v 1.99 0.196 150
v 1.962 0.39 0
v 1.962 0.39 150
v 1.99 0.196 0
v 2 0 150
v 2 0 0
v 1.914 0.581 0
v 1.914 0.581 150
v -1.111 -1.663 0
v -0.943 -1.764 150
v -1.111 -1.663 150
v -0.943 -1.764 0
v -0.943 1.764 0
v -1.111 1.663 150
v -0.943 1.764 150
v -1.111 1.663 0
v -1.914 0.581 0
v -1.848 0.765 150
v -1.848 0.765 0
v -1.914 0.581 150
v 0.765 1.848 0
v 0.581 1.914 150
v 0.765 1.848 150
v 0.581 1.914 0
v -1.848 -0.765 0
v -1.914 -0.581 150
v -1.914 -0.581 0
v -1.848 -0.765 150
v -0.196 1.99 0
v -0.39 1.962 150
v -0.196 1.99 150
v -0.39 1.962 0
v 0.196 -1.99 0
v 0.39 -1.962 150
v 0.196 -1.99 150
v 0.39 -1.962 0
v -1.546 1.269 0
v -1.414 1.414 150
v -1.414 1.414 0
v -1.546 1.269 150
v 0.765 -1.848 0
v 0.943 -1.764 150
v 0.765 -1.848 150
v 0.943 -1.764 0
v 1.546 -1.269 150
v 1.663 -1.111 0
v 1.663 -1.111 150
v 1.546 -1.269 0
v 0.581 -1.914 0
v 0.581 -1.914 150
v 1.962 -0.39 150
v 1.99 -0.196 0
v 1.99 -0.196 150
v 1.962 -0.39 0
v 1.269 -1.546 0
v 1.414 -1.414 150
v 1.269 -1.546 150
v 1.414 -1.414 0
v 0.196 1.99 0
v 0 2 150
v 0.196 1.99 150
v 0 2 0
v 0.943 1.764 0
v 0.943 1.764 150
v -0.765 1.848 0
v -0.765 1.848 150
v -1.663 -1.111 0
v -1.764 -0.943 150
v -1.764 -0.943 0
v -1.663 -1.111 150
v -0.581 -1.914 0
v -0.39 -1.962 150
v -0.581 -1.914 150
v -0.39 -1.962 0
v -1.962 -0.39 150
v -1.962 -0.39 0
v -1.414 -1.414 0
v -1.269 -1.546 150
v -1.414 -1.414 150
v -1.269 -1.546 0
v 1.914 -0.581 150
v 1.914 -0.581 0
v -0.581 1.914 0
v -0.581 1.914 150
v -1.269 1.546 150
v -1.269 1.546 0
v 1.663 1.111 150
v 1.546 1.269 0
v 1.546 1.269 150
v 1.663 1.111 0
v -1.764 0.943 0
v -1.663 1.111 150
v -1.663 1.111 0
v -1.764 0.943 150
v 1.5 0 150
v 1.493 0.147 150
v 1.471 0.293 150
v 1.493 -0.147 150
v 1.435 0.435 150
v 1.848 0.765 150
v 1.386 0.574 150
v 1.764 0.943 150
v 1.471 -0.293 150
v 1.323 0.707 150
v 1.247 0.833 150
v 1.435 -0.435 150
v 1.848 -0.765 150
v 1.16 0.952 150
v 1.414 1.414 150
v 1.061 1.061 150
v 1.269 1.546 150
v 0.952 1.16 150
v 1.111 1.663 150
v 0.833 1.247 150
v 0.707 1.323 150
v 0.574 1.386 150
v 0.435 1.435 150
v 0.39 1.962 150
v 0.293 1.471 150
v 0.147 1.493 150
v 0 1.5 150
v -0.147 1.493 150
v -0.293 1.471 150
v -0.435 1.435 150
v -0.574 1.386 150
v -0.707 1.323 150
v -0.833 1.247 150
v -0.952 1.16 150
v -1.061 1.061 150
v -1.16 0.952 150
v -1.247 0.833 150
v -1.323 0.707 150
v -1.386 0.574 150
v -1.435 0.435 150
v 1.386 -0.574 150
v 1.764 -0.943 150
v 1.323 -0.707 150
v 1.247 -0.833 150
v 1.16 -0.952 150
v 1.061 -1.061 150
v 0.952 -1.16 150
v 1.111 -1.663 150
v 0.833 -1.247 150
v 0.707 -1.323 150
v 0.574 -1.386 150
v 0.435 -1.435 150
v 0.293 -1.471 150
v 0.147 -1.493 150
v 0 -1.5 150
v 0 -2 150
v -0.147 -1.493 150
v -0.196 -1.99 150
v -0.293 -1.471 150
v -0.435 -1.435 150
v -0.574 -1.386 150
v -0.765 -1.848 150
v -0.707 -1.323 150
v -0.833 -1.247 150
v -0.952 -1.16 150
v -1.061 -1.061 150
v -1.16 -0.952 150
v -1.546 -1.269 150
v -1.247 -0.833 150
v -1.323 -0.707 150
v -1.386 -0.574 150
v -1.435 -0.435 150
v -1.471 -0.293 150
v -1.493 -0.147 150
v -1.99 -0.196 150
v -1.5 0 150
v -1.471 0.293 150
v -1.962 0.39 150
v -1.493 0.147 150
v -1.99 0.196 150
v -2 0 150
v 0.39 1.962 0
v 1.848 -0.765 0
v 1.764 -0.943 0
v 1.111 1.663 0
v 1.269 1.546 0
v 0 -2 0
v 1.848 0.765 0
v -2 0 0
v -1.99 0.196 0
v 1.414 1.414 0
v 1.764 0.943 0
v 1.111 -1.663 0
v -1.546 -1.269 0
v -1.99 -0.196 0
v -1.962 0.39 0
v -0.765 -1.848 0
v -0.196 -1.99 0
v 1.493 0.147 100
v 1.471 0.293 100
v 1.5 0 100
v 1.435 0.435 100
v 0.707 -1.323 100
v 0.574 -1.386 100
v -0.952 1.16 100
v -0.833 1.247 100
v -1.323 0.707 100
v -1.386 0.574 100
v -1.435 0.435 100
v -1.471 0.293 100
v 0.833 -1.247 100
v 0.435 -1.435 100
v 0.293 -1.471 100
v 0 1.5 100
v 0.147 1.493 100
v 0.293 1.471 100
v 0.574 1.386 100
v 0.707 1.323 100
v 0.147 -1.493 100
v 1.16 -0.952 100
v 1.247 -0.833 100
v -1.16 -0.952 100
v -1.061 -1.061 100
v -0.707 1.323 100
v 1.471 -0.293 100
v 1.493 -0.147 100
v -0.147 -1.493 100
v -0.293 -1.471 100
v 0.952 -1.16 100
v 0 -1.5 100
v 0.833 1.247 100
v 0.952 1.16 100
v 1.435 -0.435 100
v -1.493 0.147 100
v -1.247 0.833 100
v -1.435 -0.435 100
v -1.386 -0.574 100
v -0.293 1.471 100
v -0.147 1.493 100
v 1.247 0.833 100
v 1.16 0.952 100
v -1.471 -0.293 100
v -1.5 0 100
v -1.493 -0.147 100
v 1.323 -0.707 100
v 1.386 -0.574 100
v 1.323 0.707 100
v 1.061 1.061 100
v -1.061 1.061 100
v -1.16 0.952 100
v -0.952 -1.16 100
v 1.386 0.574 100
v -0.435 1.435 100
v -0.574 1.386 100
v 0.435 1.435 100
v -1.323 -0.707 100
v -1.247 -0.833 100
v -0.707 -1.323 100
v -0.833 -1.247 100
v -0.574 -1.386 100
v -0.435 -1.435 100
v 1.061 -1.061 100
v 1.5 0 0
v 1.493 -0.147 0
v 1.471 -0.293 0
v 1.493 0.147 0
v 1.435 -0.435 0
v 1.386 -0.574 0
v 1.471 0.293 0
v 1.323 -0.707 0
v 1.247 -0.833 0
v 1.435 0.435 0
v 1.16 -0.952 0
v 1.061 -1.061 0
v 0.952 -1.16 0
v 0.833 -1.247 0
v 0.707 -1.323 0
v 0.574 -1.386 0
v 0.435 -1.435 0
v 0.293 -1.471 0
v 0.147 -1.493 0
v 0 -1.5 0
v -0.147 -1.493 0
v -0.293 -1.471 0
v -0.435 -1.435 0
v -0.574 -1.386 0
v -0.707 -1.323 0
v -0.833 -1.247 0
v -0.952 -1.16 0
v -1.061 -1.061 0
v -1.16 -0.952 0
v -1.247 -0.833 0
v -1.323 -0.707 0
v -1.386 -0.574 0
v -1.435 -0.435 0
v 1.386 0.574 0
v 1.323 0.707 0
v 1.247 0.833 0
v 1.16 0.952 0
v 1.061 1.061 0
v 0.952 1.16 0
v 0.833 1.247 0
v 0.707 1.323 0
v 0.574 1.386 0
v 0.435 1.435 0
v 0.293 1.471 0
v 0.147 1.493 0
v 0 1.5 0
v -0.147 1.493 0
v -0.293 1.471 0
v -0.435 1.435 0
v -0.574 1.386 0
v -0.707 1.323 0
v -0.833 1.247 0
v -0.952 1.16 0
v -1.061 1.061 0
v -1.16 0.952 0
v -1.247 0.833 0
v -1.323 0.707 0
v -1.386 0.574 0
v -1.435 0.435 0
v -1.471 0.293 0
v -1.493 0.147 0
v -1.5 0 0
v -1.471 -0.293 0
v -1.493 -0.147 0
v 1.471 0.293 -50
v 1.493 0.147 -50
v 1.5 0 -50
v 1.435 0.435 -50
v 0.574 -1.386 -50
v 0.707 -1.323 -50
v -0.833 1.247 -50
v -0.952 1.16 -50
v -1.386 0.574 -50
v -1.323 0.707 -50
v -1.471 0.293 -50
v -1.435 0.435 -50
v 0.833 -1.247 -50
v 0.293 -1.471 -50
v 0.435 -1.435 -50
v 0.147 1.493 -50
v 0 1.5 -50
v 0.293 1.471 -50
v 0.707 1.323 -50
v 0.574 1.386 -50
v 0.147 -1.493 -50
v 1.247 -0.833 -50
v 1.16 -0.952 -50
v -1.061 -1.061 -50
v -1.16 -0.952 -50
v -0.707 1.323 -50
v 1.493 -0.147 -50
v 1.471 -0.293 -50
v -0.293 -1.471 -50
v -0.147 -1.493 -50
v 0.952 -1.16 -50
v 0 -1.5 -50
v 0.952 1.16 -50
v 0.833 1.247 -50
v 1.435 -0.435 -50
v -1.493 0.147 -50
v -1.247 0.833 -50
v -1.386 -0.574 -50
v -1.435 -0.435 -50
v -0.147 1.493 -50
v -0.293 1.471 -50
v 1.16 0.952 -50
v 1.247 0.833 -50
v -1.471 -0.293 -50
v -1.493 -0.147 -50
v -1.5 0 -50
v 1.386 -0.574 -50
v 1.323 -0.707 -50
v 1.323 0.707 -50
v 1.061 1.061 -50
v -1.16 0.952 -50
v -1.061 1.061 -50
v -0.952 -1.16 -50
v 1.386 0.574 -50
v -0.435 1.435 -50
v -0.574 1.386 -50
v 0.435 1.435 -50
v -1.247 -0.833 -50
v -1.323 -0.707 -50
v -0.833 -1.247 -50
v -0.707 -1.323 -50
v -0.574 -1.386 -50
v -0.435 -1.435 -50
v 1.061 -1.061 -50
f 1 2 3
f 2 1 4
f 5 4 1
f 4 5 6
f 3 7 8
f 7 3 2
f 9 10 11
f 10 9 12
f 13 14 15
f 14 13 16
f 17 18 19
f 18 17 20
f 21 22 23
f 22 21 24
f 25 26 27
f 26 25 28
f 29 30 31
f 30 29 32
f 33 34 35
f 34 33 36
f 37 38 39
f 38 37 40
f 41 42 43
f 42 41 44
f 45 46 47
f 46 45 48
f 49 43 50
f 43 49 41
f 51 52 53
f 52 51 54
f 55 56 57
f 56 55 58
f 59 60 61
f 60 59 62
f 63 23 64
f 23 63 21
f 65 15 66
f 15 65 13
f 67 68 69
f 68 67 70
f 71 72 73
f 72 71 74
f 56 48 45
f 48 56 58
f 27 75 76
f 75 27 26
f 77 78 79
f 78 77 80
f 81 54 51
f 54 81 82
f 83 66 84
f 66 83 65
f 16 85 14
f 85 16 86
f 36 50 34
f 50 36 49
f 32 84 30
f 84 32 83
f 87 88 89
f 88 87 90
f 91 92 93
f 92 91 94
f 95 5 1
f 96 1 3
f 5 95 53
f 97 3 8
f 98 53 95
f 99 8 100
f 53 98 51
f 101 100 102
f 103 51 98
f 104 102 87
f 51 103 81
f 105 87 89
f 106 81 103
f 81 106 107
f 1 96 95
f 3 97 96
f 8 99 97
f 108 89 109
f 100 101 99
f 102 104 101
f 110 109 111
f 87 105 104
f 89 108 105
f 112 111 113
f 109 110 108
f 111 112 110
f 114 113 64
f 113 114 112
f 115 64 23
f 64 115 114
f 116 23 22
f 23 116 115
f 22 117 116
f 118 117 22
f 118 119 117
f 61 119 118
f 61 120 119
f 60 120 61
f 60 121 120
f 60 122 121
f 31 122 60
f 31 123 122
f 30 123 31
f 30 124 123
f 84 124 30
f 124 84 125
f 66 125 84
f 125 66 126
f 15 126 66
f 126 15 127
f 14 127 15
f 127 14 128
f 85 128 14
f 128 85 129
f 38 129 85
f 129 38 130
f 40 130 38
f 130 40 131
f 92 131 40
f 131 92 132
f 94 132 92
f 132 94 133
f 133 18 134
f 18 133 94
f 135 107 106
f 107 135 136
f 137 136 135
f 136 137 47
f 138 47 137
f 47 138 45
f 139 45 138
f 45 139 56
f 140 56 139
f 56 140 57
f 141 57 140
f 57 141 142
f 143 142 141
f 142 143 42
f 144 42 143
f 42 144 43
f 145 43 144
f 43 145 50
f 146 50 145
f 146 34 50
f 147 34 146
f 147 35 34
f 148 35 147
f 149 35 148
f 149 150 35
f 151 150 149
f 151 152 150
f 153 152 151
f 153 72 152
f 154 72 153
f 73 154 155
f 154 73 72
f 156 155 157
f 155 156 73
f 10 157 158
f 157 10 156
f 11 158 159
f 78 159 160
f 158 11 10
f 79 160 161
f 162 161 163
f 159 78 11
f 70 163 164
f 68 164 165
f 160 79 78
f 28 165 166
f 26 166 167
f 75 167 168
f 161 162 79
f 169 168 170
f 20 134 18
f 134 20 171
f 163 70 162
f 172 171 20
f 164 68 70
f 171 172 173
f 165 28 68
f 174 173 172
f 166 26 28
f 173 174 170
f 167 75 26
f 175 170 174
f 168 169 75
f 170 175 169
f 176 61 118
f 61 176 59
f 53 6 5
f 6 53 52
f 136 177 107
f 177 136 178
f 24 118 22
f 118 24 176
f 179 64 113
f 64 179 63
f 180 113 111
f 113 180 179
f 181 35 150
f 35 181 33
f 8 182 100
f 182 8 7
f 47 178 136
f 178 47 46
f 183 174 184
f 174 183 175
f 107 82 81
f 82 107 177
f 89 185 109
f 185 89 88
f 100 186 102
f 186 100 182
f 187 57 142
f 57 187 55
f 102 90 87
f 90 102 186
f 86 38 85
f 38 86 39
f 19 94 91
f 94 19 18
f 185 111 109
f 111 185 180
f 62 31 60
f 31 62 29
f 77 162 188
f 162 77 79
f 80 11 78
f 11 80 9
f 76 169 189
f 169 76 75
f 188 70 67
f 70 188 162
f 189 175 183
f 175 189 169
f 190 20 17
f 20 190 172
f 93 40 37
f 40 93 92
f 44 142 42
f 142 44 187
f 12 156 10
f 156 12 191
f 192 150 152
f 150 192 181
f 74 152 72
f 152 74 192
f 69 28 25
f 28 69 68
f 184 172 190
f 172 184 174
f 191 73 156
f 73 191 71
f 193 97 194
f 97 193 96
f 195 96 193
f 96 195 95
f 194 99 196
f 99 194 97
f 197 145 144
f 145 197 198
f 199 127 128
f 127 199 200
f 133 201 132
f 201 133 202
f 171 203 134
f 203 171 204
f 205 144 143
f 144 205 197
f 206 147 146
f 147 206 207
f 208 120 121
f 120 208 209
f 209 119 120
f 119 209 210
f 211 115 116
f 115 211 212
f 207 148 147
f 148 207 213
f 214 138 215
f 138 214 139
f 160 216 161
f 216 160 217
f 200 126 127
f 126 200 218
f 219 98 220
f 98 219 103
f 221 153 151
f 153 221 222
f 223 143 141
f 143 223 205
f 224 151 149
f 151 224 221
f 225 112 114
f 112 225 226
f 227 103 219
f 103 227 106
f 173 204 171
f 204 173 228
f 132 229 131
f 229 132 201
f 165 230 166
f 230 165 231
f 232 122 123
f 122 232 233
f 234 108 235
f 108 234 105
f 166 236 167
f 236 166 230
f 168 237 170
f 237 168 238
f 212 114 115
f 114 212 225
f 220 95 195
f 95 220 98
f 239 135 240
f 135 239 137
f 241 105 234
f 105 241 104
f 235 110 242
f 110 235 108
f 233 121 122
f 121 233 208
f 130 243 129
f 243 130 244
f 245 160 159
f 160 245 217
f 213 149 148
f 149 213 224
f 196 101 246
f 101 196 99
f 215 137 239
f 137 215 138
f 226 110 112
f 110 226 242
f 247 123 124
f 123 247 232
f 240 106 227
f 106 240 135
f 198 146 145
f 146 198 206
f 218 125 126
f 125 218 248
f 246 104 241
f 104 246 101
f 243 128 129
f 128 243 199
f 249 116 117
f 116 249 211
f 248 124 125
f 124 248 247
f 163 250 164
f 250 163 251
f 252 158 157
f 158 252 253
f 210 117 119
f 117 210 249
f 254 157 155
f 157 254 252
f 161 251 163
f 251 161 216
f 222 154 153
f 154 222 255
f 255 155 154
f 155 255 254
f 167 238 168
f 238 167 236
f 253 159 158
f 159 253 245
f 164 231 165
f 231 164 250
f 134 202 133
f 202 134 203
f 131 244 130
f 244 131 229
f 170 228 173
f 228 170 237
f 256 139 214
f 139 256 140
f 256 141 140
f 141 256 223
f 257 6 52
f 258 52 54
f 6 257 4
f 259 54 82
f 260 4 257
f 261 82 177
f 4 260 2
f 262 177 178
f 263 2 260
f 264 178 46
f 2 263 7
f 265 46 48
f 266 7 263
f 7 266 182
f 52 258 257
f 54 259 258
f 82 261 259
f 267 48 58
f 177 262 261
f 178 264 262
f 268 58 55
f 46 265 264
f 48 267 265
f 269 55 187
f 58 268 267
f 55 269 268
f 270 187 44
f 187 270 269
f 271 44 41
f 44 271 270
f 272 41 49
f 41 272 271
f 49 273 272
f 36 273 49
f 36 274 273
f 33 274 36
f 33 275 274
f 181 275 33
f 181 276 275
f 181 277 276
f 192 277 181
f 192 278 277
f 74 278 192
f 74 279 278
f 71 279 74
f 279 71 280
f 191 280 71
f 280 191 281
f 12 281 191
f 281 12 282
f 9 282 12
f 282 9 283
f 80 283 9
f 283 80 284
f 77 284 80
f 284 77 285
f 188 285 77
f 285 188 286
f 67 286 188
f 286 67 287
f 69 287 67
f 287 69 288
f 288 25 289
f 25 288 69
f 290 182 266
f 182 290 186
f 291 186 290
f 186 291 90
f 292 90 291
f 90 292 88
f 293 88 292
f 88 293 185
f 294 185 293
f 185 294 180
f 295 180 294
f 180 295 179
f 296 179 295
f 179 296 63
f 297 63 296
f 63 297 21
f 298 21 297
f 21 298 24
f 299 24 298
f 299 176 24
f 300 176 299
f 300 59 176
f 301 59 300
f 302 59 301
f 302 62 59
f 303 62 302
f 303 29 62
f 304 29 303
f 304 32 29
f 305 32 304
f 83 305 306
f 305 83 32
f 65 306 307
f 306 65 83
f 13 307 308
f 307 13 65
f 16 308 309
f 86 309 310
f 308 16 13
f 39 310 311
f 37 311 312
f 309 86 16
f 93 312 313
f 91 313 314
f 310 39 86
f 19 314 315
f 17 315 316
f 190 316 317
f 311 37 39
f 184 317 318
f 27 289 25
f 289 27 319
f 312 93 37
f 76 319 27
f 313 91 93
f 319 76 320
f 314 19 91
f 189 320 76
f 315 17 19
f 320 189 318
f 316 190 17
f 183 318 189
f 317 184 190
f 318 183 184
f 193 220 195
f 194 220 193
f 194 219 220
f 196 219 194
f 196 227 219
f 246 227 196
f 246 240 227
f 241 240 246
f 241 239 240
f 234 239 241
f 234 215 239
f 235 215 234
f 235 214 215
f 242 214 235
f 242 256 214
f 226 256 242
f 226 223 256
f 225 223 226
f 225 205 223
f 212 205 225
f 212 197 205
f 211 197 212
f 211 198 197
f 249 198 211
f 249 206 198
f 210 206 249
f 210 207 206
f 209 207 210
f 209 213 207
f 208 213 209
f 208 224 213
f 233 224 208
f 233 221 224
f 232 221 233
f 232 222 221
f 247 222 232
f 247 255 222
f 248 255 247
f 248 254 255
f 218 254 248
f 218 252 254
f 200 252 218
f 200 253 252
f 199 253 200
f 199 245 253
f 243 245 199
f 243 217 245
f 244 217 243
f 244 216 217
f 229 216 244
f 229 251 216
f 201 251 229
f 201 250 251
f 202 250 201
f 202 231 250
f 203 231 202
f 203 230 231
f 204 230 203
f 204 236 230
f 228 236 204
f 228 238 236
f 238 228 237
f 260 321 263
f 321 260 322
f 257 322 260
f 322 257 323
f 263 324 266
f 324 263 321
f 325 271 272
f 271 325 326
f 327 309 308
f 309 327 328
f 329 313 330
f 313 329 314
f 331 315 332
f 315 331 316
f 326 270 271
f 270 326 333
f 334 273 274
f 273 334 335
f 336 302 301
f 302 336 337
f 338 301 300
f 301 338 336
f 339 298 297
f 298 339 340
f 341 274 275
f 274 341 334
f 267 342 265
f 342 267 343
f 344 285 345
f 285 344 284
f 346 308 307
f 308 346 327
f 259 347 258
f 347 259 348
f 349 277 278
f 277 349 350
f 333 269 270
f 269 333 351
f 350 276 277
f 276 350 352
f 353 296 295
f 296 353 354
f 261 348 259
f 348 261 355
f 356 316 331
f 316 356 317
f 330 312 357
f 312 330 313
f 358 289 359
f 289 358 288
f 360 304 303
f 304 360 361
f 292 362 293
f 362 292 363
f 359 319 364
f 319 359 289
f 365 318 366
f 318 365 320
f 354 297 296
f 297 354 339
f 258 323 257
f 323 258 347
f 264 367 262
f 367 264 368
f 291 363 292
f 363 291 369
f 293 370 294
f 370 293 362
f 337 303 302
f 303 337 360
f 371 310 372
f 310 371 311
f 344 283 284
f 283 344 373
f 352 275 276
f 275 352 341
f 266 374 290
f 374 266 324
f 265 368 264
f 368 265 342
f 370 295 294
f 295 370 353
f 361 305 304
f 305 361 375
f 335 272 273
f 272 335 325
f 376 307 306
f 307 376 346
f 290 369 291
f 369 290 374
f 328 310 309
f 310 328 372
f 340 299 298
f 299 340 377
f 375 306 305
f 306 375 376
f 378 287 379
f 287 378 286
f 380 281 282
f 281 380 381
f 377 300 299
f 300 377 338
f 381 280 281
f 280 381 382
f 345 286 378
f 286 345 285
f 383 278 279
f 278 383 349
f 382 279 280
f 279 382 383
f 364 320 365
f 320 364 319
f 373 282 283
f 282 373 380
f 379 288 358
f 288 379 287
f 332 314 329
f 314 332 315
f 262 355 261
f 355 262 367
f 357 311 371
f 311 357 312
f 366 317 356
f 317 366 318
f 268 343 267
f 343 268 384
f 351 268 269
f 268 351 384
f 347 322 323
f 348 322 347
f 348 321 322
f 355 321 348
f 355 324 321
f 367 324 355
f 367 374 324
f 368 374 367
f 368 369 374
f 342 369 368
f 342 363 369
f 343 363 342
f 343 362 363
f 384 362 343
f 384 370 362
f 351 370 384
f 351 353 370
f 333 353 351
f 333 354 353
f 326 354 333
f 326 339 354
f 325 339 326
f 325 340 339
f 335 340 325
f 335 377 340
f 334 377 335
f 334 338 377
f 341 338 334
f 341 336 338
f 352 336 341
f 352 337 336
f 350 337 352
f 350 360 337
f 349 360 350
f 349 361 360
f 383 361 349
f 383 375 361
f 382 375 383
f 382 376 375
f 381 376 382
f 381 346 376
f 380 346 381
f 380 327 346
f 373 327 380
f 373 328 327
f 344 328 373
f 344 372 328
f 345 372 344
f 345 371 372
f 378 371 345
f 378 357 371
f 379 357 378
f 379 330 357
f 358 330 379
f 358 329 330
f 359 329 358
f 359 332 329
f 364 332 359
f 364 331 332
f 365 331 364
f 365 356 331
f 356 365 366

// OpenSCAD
cylinder(h=100, r=2, $fn=64);  
cylinder(h=100, r=1.5, $fn=64, center=true);  
difference() {  
    translate([0, 0, 50]) cylinder(h=100, r=2, $fn=64);  
    translate([0, 0, 50]) cylinder(h=100, r=1.5, $fn=64);  
}
